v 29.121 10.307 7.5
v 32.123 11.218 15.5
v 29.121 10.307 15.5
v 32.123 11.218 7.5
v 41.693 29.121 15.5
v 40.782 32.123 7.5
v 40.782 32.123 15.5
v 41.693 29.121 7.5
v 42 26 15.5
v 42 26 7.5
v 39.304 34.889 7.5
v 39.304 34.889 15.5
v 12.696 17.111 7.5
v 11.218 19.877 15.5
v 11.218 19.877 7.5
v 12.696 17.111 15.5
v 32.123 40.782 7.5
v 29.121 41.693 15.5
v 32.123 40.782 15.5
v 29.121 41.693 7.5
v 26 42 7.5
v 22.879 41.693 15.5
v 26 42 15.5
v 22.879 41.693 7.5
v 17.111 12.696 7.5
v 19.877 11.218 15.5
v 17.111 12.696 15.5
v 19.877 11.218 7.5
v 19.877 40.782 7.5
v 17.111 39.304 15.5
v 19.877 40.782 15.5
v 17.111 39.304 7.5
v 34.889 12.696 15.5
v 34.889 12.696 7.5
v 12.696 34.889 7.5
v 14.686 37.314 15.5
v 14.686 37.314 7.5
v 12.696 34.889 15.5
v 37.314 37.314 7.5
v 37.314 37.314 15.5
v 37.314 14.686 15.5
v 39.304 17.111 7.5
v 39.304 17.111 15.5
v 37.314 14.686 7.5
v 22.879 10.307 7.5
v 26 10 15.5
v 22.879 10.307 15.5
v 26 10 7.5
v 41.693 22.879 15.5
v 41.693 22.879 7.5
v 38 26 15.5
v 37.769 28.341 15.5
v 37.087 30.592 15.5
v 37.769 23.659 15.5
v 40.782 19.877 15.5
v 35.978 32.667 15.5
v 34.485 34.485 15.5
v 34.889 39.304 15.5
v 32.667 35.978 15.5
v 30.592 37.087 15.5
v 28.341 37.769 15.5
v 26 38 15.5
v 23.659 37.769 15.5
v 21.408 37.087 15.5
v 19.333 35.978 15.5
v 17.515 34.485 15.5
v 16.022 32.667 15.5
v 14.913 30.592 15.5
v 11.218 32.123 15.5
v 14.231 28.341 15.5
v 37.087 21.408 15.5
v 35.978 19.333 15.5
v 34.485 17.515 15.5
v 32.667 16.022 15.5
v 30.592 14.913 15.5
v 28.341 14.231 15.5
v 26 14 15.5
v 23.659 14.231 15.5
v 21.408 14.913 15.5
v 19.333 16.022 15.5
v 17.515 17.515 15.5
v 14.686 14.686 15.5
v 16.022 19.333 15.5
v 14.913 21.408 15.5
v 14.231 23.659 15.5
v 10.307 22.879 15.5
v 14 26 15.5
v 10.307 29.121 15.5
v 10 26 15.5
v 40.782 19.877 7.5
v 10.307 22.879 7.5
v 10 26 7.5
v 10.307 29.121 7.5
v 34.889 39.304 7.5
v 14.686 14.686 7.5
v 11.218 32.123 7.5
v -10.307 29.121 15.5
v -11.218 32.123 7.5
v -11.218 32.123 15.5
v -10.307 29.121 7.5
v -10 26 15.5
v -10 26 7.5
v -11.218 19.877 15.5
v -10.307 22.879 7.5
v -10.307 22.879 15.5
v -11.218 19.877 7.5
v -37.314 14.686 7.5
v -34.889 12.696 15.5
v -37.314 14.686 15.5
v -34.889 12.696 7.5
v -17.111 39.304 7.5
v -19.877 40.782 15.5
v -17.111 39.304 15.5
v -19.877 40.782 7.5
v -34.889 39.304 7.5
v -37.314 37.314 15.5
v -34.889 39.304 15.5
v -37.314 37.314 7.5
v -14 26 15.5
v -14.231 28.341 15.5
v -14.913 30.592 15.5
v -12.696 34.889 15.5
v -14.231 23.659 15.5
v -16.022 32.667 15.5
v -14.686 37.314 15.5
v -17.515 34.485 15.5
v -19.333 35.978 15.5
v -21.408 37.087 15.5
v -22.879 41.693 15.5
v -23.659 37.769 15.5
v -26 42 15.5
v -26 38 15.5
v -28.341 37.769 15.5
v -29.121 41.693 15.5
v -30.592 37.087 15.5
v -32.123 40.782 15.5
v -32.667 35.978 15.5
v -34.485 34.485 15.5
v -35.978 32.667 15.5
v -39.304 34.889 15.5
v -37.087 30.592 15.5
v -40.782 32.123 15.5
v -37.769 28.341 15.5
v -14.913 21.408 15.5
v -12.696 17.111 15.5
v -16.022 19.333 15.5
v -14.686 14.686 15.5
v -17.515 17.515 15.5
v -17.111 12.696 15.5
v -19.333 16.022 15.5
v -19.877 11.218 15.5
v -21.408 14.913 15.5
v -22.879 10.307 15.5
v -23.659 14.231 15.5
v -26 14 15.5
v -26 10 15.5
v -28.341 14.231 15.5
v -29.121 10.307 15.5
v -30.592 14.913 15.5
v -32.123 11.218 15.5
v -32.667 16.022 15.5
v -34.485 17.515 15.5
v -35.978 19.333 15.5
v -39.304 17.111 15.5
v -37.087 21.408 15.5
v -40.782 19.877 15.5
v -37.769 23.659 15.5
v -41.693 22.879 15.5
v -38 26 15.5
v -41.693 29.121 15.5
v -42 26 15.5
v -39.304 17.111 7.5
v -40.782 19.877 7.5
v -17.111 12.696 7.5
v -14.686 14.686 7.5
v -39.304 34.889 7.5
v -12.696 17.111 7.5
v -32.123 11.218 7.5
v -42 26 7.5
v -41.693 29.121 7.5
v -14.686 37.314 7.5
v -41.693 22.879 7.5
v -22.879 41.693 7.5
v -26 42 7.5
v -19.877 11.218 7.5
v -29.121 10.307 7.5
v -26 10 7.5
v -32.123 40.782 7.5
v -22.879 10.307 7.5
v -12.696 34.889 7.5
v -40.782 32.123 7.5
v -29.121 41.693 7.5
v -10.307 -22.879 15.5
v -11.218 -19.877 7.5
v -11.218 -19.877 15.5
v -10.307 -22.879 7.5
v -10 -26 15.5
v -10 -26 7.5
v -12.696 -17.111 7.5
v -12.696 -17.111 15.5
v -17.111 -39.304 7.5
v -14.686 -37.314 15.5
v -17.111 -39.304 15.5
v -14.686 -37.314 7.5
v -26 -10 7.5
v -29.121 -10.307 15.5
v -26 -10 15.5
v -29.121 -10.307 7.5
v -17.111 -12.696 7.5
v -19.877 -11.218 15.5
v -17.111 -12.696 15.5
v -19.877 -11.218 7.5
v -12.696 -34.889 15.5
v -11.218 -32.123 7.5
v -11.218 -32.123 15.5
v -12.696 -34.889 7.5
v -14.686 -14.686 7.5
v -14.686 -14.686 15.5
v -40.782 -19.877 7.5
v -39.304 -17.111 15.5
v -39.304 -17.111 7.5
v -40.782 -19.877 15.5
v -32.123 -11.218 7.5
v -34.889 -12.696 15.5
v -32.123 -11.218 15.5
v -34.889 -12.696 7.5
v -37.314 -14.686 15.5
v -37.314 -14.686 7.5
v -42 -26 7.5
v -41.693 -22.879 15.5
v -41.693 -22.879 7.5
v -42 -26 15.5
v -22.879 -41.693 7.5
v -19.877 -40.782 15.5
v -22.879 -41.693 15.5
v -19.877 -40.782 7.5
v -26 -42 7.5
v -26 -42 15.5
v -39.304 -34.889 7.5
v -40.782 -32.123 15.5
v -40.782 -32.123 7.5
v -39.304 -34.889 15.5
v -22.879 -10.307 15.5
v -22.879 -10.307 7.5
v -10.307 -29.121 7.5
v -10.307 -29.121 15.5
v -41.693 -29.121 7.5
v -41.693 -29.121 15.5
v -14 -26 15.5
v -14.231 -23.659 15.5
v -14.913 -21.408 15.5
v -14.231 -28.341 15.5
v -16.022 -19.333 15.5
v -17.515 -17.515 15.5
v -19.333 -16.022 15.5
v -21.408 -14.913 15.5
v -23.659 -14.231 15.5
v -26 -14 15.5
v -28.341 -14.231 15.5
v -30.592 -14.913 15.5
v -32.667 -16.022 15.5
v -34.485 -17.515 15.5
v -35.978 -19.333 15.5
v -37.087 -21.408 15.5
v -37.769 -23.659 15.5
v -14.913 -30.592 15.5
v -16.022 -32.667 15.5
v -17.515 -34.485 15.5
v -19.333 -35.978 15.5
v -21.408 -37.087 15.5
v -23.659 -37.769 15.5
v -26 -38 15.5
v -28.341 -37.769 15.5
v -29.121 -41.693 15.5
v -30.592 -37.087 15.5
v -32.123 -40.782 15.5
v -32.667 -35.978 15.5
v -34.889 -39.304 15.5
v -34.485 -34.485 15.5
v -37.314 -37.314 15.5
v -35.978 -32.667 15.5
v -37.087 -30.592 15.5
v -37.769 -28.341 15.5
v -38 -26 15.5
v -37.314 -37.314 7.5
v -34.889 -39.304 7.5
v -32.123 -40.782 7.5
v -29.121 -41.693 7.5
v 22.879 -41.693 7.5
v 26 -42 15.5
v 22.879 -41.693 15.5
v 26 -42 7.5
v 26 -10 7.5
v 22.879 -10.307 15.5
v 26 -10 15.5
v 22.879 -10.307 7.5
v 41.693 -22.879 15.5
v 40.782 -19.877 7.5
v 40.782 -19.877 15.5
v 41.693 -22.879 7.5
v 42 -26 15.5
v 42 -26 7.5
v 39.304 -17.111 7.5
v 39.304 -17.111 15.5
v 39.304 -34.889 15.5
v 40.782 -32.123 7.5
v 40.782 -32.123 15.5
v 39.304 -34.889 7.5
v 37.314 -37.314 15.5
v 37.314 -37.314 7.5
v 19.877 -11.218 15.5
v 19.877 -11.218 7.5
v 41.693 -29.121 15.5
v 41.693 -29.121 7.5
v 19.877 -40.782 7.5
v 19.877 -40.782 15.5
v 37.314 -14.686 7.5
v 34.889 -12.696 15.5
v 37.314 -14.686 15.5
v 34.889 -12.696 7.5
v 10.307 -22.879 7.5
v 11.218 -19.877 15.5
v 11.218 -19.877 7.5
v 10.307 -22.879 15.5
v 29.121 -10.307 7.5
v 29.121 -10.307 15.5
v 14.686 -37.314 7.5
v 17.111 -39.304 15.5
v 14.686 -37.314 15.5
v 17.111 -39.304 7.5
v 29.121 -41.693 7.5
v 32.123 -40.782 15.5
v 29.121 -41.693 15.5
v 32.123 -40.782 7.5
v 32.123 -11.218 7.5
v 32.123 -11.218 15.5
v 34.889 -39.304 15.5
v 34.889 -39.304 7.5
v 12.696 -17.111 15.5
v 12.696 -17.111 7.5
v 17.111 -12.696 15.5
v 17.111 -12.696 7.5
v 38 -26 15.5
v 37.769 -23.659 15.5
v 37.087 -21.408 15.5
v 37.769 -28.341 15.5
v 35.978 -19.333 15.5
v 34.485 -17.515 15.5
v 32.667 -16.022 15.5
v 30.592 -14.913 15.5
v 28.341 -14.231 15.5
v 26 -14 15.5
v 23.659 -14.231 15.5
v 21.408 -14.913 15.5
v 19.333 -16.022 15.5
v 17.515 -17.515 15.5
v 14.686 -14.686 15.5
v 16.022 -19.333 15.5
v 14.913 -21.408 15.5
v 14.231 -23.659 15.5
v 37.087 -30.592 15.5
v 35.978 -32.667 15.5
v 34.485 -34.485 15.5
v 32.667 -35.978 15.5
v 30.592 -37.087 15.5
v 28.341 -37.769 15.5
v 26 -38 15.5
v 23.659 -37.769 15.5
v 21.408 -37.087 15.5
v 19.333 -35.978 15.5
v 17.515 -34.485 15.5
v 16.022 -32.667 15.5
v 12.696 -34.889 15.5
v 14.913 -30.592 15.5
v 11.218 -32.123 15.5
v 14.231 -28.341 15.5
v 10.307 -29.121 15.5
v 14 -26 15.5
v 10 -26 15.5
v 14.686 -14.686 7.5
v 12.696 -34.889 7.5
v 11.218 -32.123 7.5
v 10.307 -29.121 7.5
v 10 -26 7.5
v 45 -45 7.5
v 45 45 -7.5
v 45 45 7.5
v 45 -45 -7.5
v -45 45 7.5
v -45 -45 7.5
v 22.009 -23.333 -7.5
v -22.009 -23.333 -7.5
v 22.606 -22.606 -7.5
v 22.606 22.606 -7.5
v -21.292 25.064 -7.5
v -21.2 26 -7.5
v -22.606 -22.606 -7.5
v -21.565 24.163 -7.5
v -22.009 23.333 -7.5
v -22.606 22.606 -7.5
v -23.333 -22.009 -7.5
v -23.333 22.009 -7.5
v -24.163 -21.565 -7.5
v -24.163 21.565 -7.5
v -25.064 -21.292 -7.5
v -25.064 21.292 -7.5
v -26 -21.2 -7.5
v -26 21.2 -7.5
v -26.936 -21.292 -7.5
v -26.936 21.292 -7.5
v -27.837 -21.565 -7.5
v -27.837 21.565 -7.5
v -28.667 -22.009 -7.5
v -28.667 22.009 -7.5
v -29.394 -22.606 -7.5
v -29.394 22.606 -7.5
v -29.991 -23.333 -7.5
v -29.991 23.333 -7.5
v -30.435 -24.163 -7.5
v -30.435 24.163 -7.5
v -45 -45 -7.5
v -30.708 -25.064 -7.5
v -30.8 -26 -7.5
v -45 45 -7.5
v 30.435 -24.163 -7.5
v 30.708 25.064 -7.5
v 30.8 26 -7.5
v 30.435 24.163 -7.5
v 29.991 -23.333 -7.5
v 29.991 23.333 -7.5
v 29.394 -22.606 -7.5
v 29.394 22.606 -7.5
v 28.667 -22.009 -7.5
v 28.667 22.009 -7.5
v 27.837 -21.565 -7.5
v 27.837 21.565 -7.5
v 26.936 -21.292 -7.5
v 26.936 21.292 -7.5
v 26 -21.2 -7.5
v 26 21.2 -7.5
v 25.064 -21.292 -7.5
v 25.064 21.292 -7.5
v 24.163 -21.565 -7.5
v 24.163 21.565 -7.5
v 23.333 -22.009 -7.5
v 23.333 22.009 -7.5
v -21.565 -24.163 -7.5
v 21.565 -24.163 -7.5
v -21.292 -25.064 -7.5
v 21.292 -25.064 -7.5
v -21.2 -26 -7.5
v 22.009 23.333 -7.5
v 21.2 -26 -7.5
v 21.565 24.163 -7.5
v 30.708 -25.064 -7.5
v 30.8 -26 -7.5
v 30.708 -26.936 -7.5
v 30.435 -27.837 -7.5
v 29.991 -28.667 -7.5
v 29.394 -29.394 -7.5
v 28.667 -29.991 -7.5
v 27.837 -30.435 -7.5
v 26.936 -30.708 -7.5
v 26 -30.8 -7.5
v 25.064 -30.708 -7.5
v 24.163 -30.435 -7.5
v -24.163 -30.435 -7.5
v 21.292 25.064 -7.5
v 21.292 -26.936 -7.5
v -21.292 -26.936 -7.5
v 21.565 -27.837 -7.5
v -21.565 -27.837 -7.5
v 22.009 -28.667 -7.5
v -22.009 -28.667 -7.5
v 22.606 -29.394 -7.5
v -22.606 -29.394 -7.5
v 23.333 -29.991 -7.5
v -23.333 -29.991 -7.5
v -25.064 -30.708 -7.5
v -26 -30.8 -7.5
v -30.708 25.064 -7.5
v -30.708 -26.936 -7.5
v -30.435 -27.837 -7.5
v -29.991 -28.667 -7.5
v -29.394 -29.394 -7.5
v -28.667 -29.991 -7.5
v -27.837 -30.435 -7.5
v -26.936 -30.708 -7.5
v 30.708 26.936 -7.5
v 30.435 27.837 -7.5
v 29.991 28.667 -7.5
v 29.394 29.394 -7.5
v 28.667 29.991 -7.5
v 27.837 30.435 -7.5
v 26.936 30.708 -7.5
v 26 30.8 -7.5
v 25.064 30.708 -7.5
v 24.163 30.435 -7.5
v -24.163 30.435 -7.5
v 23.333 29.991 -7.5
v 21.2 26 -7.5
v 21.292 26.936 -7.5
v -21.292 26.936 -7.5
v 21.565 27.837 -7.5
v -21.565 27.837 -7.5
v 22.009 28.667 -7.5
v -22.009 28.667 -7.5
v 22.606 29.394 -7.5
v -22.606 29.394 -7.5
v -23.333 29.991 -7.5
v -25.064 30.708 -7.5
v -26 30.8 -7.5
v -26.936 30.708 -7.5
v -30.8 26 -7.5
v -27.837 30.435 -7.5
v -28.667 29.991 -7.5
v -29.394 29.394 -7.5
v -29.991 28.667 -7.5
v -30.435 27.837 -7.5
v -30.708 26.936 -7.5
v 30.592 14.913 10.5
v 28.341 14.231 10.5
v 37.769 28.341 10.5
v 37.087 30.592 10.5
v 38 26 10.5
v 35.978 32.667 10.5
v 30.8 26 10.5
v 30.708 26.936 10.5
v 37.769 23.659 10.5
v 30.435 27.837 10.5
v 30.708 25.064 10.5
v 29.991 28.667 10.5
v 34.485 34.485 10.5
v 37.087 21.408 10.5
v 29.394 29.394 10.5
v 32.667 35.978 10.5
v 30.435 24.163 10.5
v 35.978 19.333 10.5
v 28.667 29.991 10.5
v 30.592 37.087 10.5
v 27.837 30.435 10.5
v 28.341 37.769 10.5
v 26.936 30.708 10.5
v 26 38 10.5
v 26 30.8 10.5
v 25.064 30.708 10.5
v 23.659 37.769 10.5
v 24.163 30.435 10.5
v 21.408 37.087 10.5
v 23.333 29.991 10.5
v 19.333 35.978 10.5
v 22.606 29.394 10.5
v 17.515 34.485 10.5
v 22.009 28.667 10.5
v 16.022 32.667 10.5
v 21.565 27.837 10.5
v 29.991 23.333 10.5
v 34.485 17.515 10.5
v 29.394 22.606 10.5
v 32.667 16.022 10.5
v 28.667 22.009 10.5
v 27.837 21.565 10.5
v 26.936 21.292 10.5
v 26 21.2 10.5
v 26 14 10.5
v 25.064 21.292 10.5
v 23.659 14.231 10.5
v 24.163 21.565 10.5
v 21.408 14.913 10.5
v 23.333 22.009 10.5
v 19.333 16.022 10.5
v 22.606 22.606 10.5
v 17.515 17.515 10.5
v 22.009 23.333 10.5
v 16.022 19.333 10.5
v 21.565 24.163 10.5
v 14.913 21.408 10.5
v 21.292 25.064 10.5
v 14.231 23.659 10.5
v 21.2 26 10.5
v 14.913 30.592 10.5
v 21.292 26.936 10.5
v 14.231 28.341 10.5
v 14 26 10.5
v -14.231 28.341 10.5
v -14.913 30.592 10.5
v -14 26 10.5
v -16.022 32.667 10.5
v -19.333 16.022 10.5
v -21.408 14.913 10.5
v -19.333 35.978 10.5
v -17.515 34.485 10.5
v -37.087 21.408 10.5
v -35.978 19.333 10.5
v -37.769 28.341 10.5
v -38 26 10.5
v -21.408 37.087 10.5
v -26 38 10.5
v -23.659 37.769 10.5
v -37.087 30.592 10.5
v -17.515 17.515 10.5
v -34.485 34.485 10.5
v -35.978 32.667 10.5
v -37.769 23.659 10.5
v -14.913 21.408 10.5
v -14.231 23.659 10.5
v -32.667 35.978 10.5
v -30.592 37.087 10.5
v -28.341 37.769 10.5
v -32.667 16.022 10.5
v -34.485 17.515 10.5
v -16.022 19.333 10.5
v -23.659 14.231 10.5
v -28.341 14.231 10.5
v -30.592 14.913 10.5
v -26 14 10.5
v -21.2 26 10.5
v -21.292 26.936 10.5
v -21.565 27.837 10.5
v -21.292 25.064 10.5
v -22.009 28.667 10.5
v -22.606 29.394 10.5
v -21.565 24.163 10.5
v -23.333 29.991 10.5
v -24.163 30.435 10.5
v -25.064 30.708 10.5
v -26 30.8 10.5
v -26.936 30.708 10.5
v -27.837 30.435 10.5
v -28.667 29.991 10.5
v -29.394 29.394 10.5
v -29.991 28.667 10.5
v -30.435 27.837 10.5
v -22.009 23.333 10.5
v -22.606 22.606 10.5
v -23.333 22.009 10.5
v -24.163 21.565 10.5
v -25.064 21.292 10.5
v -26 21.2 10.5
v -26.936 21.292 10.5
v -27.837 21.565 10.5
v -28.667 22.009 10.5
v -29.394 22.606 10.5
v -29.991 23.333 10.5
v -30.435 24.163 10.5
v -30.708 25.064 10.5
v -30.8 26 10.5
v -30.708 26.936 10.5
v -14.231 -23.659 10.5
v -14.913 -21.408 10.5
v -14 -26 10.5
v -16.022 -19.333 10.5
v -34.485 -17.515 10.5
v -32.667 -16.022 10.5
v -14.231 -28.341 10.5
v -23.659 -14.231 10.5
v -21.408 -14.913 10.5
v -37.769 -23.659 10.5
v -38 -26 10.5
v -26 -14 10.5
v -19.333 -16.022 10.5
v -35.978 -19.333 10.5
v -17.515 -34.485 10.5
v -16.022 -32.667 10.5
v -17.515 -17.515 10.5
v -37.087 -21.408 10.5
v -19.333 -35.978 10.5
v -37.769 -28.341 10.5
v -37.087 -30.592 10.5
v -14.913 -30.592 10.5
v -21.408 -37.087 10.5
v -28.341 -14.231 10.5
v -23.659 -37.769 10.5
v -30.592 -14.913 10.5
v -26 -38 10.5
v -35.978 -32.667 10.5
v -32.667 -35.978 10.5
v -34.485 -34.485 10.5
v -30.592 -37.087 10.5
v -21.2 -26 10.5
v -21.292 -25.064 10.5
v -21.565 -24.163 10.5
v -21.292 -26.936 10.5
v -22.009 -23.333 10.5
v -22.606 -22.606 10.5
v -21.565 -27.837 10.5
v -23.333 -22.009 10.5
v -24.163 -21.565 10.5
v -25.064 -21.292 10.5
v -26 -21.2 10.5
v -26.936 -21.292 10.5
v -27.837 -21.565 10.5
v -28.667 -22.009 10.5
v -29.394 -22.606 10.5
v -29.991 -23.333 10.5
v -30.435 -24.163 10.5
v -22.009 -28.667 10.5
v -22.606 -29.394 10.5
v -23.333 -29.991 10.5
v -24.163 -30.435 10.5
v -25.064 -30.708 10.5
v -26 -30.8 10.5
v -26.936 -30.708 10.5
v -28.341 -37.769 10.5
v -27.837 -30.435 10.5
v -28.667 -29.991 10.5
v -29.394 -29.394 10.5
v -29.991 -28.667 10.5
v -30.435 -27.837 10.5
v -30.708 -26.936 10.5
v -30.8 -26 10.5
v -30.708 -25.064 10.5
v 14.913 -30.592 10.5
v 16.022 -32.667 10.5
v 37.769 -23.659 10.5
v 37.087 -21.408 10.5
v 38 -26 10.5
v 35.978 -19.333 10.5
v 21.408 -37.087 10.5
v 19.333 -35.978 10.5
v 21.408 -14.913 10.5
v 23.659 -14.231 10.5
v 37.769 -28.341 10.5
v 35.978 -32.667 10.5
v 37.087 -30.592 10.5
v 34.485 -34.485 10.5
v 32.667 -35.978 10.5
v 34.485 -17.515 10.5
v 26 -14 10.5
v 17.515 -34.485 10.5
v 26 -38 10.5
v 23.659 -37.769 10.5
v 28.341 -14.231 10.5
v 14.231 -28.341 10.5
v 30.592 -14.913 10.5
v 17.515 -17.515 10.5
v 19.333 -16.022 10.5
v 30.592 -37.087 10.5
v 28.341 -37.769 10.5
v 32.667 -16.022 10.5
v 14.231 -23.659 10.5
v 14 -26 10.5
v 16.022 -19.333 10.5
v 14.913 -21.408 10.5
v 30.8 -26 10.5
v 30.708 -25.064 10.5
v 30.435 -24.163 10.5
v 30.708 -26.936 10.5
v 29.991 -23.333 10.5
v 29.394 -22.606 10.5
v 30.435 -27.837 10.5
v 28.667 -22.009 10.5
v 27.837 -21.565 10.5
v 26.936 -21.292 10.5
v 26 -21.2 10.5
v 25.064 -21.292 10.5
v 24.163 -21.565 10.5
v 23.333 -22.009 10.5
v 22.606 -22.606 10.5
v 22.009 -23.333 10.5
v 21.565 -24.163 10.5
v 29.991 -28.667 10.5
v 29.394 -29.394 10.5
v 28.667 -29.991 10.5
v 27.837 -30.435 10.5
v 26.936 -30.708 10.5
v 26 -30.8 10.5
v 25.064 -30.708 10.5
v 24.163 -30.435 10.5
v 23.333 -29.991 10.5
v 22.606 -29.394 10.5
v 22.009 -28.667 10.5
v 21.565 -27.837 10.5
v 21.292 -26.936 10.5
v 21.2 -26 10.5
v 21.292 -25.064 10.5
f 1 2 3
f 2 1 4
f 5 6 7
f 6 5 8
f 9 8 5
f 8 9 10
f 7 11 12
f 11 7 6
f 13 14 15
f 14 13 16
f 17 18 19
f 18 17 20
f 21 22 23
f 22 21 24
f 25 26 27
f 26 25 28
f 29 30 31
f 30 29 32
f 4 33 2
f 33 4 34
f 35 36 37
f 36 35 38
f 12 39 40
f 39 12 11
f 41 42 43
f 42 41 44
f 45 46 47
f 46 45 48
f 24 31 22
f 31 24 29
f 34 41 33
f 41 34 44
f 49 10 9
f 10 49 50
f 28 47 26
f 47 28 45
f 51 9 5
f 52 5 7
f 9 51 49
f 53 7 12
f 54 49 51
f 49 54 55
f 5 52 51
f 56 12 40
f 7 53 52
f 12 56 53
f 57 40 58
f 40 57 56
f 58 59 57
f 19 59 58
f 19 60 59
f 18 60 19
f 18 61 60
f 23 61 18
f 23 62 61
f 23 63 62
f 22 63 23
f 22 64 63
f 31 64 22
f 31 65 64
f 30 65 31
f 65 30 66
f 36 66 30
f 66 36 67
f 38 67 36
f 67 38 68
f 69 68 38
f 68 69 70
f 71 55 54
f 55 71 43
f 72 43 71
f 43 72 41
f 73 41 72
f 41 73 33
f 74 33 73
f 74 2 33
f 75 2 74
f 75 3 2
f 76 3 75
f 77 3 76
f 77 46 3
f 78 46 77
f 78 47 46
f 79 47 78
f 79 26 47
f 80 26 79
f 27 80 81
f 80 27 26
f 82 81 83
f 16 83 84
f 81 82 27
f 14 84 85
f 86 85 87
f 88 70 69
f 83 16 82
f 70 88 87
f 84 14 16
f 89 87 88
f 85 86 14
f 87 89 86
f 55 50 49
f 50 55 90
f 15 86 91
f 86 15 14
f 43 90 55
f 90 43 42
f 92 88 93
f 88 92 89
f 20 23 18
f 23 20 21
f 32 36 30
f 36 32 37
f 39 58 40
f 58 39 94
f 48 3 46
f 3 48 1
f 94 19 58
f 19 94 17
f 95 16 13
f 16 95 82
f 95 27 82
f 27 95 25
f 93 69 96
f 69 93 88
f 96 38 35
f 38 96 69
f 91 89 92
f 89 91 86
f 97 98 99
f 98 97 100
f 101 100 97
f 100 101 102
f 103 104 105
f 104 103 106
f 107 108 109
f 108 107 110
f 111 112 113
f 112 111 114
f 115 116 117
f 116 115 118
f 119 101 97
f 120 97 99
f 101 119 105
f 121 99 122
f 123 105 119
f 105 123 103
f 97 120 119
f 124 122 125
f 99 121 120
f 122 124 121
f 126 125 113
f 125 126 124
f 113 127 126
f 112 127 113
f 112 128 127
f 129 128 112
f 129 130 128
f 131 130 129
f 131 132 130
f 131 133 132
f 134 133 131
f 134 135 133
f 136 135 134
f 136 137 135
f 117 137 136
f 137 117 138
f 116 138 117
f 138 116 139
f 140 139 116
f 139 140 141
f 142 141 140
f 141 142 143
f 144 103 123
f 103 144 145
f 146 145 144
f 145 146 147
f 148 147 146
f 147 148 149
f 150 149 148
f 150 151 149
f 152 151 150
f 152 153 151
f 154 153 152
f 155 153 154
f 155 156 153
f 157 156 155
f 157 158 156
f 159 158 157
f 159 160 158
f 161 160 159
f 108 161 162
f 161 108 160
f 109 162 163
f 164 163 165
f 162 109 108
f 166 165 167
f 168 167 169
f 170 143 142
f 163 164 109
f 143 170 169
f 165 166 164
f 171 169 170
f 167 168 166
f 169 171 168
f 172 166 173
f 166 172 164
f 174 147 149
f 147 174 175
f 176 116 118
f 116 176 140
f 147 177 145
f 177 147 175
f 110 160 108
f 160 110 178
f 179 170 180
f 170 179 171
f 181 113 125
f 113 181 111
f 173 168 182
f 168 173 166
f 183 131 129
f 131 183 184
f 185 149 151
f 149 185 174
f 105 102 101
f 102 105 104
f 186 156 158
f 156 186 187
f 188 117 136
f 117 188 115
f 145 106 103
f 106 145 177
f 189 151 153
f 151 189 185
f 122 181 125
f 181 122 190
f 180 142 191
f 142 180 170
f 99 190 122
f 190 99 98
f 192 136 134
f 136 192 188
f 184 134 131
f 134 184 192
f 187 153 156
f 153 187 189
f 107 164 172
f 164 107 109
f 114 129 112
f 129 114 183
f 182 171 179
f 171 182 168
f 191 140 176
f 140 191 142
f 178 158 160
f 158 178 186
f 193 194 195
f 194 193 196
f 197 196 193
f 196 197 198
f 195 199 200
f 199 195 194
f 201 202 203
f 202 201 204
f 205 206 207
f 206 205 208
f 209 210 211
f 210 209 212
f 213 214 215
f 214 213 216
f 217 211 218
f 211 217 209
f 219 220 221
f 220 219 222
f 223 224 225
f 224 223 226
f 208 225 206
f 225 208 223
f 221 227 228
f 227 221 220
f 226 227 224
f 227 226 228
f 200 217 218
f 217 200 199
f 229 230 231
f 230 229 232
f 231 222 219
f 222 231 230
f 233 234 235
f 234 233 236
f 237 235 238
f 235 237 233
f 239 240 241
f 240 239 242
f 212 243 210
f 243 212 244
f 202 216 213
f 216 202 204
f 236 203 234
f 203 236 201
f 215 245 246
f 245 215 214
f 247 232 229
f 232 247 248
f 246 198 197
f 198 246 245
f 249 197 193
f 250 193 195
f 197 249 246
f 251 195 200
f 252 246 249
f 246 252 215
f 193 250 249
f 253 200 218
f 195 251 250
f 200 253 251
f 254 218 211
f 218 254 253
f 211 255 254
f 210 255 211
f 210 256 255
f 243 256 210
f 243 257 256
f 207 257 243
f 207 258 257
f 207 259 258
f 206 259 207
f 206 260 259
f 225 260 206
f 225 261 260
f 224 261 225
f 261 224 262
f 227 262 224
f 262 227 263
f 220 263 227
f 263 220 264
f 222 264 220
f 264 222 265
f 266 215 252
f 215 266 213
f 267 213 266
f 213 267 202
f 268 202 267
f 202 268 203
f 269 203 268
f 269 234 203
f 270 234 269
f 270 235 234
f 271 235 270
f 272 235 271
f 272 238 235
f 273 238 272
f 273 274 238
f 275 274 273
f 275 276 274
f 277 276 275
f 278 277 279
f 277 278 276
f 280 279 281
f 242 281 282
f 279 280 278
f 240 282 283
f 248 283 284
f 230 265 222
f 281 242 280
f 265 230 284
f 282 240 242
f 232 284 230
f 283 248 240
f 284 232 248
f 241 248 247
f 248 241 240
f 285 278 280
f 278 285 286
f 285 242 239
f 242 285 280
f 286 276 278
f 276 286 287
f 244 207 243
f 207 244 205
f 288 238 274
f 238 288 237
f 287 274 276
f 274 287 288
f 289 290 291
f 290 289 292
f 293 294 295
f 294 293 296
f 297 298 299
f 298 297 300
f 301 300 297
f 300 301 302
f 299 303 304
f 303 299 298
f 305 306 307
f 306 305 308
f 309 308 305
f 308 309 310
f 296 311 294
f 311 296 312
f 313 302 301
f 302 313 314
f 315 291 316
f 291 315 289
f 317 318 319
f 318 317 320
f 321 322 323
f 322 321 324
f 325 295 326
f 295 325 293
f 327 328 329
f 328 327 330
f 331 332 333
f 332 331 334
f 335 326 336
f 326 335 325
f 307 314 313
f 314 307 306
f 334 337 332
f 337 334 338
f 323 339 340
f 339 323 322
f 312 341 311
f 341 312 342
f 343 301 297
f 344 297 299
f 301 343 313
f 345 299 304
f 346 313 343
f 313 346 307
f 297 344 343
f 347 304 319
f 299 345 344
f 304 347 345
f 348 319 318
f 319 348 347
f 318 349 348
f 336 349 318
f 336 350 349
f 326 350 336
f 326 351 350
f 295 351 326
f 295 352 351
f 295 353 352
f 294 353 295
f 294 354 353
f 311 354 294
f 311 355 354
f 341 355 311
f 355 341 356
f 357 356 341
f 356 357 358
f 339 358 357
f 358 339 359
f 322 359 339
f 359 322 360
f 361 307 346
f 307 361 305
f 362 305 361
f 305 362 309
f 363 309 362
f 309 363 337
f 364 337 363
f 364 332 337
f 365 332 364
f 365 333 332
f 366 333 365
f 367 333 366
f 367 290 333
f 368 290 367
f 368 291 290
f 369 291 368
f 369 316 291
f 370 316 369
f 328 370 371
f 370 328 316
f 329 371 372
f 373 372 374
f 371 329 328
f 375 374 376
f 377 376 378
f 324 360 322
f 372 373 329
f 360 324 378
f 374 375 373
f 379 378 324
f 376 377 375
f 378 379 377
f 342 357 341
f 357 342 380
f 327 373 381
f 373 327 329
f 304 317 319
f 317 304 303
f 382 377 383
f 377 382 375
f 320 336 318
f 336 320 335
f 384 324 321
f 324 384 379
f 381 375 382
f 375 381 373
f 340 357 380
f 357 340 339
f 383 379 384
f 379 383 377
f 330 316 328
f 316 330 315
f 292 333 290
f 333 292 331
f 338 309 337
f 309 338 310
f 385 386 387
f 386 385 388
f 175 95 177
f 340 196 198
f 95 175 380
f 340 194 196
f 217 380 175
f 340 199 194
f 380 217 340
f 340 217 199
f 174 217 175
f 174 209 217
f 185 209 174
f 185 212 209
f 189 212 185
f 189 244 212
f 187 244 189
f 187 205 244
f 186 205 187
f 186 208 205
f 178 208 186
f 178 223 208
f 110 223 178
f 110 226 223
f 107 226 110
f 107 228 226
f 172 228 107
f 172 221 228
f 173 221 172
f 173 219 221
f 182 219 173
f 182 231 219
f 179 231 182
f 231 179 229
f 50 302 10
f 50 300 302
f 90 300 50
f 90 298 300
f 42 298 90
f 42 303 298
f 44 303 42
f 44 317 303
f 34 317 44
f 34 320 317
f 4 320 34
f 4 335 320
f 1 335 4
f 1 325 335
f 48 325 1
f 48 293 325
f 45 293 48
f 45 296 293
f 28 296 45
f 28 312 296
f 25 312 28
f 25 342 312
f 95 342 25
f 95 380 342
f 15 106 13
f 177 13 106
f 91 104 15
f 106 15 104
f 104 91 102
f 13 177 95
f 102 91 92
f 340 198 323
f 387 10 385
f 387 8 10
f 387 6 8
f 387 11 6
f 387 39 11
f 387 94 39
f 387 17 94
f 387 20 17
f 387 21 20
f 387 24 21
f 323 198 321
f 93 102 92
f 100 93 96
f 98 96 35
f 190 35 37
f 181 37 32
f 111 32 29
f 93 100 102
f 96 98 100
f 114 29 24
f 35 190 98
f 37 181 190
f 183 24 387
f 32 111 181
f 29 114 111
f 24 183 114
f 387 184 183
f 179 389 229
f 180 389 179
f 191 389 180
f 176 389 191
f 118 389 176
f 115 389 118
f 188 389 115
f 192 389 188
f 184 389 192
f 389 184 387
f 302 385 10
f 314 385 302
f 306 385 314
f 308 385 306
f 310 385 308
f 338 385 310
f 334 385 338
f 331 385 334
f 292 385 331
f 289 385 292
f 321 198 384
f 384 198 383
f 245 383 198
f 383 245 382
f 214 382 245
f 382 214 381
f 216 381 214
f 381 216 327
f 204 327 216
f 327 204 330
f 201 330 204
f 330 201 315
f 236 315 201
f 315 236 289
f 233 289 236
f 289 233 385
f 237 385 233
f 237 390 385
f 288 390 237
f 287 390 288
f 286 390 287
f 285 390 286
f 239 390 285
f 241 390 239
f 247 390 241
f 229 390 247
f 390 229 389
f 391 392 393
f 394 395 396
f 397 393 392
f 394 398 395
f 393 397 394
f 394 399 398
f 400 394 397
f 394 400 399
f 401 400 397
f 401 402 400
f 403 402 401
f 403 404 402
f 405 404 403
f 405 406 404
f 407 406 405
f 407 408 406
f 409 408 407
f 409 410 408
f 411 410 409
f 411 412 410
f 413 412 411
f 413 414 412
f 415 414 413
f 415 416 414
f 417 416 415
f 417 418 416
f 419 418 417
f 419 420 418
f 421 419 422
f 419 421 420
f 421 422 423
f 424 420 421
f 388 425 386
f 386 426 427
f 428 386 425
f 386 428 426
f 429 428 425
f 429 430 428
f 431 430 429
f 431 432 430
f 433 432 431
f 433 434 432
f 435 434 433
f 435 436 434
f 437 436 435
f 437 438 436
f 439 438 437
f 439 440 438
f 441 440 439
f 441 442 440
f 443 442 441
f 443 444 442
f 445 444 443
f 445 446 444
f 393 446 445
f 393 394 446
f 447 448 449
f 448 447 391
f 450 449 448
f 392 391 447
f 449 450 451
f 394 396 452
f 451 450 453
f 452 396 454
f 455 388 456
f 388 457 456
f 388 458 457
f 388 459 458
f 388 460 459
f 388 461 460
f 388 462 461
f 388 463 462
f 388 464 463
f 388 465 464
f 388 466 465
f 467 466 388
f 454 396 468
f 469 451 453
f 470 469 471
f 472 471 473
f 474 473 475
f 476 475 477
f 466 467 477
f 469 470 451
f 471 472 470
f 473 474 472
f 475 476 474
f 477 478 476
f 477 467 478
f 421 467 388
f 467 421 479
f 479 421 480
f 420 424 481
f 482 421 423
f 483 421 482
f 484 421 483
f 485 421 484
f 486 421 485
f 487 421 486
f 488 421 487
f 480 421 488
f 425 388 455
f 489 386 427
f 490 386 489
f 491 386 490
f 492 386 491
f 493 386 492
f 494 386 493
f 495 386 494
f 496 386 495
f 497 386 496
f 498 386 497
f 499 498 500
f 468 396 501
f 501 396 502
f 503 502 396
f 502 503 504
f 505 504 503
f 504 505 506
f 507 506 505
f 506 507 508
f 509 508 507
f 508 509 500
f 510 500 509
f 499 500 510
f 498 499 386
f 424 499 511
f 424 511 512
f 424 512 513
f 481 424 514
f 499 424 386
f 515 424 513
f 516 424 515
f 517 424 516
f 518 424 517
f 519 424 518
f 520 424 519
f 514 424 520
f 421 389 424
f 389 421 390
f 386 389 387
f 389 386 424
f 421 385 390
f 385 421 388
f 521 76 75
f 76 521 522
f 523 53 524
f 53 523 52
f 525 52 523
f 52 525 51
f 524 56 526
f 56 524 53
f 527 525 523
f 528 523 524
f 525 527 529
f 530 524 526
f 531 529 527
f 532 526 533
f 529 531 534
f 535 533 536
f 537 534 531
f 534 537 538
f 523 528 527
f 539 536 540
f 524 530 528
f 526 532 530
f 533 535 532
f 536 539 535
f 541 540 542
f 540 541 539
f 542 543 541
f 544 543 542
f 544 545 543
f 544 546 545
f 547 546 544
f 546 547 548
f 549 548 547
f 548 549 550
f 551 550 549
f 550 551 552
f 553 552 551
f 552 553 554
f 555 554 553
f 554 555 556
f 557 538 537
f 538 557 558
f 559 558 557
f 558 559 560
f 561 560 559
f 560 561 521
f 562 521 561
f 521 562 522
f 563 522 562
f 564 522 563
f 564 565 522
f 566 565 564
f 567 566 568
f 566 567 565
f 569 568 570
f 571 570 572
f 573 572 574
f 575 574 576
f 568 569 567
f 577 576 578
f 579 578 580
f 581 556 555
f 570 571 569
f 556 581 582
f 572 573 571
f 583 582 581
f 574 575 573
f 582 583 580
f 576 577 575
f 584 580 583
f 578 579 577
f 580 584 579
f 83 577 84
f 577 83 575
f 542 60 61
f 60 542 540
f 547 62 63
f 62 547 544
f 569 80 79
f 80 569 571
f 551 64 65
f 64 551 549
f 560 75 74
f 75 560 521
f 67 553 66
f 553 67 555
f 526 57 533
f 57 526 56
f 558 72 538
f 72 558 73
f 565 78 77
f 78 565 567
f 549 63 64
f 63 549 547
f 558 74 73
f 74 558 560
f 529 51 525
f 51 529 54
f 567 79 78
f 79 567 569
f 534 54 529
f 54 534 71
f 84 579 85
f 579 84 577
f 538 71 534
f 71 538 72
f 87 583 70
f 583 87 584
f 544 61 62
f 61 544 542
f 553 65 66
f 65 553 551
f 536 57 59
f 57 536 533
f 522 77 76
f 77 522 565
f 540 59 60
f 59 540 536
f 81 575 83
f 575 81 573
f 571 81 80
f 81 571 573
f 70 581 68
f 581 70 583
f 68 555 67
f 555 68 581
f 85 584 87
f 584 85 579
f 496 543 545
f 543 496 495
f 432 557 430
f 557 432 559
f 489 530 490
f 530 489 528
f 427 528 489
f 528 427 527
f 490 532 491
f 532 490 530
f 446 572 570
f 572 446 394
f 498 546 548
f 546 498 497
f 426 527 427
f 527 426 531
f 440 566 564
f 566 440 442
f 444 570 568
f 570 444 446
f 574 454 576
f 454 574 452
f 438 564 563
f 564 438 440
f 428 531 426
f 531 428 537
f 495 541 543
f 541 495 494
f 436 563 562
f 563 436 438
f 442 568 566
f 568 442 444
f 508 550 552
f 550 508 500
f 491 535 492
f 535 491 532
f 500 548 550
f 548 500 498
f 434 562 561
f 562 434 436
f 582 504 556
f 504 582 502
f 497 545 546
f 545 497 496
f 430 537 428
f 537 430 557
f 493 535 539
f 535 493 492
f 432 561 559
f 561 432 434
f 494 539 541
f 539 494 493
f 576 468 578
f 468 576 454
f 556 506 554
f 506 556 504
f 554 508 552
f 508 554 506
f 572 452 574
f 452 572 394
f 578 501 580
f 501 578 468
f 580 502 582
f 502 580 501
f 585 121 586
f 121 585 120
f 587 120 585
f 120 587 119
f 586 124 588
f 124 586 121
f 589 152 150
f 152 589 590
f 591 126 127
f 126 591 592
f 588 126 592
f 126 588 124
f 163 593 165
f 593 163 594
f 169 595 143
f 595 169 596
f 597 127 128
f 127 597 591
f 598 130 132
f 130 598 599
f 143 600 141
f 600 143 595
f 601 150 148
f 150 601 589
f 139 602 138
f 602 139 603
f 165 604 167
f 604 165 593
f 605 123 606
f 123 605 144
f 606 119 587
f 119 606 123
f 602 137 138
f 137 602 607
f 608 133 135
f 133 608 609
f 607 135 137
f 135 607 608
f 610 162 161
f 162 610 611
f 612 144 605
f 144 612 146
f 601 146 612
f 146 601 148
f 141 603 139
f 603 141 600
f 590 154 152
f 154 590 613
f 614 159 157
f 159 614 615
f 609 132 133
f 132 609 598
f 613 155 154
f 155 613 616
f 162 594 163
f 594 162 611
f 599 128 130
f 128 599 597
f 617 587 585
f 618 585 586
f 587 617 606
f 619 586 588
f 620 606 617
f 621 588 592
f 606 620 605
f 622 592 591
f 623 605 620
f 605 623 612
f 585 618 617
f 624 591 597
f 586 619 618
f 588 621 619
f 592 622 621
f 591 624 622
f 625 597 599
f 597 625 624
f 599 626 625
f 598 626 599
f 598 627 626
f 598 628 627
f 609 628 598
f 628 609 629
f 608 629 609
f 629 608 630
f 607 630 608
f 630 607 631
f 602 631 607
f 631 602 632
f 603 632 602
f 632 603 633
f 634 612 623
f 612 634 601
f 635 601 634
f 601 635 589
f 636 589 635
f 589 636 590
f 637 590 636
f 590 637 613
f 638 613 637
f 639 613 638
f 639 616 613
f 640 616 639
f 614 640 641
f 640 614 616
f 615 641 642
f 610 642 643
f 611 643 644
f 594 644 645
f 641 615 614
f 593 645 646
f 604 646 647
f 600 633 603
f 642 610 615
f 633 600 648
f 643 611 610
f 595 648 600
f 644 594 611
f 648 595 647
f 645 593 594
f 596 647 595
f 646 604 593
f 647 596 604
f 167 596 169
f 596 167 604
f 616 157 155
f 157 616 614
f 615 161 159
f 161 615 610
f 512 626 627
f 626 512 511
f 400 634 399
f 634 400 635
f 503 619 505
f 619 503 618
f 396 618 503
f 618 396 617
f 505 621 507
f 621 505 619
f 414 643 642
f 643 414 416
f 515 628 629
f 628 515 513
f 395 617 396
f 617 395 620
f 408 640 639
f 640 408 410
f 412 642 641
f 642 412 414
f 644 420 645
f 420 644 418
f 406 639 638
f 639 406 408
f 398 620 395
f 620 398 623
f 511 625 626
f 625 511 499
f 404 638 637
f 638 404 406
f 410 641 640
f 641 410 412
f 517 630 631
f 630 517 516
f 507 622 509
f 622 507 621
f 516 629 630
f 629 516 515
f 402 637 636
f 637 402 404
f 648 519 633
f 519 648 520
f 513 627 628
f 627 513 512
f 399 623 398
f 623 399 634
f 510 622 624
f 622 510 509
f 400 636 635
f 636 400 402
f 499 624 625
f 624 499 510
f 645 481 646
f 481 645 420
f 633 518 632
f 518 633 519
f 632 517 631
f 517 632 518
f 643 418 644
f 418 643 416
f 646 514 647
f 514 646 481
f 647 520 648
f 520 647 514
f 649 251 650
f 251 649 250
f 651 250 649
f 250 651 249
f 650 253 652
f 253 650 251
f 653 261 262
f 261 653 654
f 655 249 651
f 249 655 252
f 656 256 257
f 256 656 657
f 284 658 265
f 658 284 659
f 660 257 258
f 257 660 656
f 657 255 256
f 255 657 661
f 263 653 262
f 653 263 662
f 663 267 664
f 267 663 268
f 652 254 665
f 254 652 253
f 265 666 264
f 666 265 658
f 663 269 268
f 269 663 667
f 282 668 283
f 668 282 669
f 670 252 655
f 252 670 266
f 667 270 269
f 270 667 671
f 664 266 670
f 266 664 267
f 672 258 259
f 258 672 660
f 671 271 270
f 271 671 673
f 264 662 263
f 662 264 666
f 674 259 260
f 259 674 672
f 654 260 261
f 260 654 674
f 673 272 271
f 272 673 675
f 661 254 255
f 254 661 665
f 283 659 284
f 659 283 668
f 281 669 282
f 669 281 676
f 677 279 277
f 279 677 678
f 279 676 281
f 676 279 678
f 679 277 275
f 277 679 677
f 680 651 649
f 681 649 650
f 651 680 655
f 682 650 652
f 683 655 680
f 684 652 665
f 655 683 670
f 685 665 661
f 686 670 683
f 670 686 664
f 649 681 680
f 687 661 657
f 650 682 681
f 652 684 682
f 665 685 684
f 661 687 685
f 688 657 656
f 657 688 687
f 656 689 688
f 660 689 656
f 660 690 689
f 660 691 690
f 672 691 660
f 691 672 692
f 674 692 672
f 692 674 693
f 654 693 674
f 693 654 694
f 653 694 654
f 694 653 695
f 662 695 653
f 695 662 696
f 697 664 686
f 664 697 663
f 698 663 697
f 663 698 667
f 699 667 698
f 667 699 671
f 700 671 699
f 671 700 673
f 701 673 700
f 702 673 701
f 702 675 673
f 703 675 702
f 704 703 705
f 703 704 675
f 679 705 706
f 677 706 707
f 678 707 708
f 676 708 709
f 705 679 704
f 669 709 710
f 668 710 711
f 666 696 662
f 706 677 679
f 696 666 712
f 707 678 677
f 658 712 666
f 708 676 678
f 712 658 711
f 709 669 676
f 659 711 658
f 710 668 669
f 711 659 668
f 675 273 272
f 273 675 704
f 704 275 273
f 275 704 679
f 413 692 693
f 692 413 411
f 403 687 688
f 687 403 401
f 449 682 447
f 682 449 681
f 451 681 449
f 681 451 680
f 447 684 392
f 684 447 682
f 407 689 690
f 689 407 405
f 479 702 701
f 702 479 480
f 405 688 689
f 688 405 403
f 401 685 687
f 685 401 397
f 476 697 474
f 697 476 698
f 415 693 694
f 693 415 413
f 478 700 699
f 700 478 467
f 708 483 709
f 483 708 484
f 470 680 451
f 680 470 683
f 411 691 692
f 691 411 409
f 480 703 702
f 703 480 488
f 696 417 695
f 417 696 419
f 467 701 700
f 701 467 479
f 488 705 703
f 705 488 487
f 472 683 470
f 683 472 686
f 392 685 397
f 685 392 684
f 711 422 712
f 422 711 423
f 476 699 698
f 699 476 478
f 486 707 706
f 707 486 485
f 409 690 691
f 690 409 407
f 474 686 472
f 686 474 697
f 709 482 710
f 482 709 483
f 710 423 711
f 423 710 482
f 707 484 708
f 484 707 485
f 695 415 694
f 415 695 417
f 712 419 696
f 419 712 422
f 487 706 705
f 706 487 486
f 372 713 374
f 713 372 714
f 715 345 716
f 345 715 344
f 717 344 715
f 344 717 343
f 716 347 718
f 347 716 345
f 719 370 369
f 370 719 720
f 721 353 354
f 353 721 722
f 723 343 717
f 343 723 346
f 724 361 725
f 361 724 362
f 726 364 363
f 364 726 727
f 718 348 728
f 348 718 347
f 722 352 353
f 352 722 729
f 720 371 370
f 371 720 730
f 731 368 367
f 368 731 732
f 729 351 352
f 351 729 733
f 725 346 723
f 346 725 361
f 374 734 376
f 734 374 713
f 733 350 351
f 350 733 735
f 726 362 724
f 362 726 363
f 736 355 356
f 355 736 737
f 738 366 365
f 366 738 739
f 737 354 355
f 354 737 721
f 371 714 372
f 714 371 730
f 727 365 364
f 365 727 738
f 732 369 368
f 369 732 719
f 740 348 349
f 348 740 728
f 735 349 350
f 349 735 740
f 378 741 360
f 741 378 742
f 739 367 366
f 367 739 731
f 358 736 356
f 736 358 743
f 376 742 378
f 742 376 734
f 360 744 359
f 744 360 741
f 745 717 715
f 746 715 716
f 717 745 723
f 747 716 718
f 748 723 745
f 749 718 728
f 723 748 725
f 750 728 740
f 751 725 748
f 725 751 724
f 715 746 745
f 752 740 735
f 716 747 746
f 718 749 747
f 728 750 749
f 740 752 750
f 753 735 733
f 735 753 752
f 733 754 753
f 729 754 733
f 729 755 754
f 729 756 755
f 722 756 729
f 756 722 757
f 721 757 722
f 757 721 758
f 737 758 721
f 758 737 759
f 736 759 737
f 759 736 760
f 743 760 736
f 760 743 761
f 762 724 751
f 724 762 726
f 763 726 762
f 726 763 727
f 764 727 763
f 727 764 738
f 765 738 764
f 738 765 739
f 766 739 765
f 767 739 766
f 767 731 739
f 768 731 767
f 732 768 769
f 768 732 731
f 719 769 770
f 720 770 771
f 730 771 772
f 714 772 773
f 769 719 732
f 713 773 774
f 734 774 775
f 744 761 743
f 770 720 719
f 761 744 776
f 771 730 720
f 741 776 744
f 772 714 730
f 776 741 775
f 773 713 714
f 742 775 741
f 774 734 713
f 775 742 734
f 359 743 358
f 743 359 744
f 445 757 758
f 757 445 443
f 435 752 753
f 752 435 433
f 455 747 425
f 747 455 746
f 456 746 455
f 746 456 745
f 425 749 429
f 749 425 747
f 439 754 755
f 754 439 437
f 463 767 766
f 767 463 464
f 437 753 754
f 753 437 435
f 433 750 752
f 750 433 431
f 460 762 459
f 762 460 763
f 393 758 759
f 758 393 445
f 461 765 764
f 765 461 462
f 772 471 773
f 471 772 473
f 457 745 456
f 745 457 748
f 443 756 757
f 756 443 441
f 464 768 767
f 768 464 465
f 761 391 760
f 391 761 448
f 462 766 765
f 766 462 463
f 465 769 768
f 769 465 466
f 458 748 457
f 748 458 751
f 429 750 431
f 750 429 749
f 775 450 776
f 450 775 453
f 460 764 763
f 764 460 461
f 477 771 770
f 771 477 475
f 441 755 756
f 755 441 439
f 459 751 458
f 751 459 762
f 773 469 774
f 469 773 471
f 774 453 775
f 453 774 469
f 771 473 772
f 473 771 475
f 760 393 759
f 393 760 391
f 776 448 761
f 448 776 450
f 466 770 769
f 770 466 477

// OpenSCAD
$fn = 32;

// ----------------------------------------------------------------------
// Socket pad plate
// bosses with counterbored sockets for the screws
// ----------------------------------------------------------------------

// --- parameters (mm) ---
base_t = 15;           // base plate thickness
boss_h = 8;            // boss height above the base plate
boss_d = 32;           // boss diameter
socket_d = 24;         // socket diameter
socket_depth = 5;      // socket depth from the boss face
bolt_d = 9.6;          // screw clearance hole through the socket floor
plate = [90, 90, 15];  // overall size (x, y, z)
edge = 19;             // boss centre offset from the plate edge
pads = 4;              // boss count, one per corner

// --- derived feature positions (mm) ---
height = base_t + boss_h;        // = 23   overall height of the part
corner_x = plate[0] / 2 - edge;  // = 26   boss centre X
corner_y = plate[1] / 2 - edge;  // = 26   boss centre Y
feature_centers = [
  [corner_x, corner_y],
  [-corner_x, corner_y],
  [-corner_x, -corner_y],
  [corner_x, -corner_y]
];   // boss centres: sockets, holes and the pads themselves are placed from here

// base plate, bosses on feature_centers, socket + through hole in each
difference() {
  union() {
    cube(plate, center = true);
    for (centre = feature_centers)
      translate([centre[0], centre[1], plate[2] / 2 - 1])
        cylinder(d = boss_d, h = boss_h + 1);
  }
  for (centre = feature_centers) {
    translate([centre[0], centre[1], plate[2] / 2 + boss_h - socket_depth])
      cylinder(d = socket_d, h = socket_depth + 1);
    translate([centre[0], centre[1], -height])
      cylinder(d = bolt_d, h = 2 * height + 2);  // through the socket floor
  }
}
